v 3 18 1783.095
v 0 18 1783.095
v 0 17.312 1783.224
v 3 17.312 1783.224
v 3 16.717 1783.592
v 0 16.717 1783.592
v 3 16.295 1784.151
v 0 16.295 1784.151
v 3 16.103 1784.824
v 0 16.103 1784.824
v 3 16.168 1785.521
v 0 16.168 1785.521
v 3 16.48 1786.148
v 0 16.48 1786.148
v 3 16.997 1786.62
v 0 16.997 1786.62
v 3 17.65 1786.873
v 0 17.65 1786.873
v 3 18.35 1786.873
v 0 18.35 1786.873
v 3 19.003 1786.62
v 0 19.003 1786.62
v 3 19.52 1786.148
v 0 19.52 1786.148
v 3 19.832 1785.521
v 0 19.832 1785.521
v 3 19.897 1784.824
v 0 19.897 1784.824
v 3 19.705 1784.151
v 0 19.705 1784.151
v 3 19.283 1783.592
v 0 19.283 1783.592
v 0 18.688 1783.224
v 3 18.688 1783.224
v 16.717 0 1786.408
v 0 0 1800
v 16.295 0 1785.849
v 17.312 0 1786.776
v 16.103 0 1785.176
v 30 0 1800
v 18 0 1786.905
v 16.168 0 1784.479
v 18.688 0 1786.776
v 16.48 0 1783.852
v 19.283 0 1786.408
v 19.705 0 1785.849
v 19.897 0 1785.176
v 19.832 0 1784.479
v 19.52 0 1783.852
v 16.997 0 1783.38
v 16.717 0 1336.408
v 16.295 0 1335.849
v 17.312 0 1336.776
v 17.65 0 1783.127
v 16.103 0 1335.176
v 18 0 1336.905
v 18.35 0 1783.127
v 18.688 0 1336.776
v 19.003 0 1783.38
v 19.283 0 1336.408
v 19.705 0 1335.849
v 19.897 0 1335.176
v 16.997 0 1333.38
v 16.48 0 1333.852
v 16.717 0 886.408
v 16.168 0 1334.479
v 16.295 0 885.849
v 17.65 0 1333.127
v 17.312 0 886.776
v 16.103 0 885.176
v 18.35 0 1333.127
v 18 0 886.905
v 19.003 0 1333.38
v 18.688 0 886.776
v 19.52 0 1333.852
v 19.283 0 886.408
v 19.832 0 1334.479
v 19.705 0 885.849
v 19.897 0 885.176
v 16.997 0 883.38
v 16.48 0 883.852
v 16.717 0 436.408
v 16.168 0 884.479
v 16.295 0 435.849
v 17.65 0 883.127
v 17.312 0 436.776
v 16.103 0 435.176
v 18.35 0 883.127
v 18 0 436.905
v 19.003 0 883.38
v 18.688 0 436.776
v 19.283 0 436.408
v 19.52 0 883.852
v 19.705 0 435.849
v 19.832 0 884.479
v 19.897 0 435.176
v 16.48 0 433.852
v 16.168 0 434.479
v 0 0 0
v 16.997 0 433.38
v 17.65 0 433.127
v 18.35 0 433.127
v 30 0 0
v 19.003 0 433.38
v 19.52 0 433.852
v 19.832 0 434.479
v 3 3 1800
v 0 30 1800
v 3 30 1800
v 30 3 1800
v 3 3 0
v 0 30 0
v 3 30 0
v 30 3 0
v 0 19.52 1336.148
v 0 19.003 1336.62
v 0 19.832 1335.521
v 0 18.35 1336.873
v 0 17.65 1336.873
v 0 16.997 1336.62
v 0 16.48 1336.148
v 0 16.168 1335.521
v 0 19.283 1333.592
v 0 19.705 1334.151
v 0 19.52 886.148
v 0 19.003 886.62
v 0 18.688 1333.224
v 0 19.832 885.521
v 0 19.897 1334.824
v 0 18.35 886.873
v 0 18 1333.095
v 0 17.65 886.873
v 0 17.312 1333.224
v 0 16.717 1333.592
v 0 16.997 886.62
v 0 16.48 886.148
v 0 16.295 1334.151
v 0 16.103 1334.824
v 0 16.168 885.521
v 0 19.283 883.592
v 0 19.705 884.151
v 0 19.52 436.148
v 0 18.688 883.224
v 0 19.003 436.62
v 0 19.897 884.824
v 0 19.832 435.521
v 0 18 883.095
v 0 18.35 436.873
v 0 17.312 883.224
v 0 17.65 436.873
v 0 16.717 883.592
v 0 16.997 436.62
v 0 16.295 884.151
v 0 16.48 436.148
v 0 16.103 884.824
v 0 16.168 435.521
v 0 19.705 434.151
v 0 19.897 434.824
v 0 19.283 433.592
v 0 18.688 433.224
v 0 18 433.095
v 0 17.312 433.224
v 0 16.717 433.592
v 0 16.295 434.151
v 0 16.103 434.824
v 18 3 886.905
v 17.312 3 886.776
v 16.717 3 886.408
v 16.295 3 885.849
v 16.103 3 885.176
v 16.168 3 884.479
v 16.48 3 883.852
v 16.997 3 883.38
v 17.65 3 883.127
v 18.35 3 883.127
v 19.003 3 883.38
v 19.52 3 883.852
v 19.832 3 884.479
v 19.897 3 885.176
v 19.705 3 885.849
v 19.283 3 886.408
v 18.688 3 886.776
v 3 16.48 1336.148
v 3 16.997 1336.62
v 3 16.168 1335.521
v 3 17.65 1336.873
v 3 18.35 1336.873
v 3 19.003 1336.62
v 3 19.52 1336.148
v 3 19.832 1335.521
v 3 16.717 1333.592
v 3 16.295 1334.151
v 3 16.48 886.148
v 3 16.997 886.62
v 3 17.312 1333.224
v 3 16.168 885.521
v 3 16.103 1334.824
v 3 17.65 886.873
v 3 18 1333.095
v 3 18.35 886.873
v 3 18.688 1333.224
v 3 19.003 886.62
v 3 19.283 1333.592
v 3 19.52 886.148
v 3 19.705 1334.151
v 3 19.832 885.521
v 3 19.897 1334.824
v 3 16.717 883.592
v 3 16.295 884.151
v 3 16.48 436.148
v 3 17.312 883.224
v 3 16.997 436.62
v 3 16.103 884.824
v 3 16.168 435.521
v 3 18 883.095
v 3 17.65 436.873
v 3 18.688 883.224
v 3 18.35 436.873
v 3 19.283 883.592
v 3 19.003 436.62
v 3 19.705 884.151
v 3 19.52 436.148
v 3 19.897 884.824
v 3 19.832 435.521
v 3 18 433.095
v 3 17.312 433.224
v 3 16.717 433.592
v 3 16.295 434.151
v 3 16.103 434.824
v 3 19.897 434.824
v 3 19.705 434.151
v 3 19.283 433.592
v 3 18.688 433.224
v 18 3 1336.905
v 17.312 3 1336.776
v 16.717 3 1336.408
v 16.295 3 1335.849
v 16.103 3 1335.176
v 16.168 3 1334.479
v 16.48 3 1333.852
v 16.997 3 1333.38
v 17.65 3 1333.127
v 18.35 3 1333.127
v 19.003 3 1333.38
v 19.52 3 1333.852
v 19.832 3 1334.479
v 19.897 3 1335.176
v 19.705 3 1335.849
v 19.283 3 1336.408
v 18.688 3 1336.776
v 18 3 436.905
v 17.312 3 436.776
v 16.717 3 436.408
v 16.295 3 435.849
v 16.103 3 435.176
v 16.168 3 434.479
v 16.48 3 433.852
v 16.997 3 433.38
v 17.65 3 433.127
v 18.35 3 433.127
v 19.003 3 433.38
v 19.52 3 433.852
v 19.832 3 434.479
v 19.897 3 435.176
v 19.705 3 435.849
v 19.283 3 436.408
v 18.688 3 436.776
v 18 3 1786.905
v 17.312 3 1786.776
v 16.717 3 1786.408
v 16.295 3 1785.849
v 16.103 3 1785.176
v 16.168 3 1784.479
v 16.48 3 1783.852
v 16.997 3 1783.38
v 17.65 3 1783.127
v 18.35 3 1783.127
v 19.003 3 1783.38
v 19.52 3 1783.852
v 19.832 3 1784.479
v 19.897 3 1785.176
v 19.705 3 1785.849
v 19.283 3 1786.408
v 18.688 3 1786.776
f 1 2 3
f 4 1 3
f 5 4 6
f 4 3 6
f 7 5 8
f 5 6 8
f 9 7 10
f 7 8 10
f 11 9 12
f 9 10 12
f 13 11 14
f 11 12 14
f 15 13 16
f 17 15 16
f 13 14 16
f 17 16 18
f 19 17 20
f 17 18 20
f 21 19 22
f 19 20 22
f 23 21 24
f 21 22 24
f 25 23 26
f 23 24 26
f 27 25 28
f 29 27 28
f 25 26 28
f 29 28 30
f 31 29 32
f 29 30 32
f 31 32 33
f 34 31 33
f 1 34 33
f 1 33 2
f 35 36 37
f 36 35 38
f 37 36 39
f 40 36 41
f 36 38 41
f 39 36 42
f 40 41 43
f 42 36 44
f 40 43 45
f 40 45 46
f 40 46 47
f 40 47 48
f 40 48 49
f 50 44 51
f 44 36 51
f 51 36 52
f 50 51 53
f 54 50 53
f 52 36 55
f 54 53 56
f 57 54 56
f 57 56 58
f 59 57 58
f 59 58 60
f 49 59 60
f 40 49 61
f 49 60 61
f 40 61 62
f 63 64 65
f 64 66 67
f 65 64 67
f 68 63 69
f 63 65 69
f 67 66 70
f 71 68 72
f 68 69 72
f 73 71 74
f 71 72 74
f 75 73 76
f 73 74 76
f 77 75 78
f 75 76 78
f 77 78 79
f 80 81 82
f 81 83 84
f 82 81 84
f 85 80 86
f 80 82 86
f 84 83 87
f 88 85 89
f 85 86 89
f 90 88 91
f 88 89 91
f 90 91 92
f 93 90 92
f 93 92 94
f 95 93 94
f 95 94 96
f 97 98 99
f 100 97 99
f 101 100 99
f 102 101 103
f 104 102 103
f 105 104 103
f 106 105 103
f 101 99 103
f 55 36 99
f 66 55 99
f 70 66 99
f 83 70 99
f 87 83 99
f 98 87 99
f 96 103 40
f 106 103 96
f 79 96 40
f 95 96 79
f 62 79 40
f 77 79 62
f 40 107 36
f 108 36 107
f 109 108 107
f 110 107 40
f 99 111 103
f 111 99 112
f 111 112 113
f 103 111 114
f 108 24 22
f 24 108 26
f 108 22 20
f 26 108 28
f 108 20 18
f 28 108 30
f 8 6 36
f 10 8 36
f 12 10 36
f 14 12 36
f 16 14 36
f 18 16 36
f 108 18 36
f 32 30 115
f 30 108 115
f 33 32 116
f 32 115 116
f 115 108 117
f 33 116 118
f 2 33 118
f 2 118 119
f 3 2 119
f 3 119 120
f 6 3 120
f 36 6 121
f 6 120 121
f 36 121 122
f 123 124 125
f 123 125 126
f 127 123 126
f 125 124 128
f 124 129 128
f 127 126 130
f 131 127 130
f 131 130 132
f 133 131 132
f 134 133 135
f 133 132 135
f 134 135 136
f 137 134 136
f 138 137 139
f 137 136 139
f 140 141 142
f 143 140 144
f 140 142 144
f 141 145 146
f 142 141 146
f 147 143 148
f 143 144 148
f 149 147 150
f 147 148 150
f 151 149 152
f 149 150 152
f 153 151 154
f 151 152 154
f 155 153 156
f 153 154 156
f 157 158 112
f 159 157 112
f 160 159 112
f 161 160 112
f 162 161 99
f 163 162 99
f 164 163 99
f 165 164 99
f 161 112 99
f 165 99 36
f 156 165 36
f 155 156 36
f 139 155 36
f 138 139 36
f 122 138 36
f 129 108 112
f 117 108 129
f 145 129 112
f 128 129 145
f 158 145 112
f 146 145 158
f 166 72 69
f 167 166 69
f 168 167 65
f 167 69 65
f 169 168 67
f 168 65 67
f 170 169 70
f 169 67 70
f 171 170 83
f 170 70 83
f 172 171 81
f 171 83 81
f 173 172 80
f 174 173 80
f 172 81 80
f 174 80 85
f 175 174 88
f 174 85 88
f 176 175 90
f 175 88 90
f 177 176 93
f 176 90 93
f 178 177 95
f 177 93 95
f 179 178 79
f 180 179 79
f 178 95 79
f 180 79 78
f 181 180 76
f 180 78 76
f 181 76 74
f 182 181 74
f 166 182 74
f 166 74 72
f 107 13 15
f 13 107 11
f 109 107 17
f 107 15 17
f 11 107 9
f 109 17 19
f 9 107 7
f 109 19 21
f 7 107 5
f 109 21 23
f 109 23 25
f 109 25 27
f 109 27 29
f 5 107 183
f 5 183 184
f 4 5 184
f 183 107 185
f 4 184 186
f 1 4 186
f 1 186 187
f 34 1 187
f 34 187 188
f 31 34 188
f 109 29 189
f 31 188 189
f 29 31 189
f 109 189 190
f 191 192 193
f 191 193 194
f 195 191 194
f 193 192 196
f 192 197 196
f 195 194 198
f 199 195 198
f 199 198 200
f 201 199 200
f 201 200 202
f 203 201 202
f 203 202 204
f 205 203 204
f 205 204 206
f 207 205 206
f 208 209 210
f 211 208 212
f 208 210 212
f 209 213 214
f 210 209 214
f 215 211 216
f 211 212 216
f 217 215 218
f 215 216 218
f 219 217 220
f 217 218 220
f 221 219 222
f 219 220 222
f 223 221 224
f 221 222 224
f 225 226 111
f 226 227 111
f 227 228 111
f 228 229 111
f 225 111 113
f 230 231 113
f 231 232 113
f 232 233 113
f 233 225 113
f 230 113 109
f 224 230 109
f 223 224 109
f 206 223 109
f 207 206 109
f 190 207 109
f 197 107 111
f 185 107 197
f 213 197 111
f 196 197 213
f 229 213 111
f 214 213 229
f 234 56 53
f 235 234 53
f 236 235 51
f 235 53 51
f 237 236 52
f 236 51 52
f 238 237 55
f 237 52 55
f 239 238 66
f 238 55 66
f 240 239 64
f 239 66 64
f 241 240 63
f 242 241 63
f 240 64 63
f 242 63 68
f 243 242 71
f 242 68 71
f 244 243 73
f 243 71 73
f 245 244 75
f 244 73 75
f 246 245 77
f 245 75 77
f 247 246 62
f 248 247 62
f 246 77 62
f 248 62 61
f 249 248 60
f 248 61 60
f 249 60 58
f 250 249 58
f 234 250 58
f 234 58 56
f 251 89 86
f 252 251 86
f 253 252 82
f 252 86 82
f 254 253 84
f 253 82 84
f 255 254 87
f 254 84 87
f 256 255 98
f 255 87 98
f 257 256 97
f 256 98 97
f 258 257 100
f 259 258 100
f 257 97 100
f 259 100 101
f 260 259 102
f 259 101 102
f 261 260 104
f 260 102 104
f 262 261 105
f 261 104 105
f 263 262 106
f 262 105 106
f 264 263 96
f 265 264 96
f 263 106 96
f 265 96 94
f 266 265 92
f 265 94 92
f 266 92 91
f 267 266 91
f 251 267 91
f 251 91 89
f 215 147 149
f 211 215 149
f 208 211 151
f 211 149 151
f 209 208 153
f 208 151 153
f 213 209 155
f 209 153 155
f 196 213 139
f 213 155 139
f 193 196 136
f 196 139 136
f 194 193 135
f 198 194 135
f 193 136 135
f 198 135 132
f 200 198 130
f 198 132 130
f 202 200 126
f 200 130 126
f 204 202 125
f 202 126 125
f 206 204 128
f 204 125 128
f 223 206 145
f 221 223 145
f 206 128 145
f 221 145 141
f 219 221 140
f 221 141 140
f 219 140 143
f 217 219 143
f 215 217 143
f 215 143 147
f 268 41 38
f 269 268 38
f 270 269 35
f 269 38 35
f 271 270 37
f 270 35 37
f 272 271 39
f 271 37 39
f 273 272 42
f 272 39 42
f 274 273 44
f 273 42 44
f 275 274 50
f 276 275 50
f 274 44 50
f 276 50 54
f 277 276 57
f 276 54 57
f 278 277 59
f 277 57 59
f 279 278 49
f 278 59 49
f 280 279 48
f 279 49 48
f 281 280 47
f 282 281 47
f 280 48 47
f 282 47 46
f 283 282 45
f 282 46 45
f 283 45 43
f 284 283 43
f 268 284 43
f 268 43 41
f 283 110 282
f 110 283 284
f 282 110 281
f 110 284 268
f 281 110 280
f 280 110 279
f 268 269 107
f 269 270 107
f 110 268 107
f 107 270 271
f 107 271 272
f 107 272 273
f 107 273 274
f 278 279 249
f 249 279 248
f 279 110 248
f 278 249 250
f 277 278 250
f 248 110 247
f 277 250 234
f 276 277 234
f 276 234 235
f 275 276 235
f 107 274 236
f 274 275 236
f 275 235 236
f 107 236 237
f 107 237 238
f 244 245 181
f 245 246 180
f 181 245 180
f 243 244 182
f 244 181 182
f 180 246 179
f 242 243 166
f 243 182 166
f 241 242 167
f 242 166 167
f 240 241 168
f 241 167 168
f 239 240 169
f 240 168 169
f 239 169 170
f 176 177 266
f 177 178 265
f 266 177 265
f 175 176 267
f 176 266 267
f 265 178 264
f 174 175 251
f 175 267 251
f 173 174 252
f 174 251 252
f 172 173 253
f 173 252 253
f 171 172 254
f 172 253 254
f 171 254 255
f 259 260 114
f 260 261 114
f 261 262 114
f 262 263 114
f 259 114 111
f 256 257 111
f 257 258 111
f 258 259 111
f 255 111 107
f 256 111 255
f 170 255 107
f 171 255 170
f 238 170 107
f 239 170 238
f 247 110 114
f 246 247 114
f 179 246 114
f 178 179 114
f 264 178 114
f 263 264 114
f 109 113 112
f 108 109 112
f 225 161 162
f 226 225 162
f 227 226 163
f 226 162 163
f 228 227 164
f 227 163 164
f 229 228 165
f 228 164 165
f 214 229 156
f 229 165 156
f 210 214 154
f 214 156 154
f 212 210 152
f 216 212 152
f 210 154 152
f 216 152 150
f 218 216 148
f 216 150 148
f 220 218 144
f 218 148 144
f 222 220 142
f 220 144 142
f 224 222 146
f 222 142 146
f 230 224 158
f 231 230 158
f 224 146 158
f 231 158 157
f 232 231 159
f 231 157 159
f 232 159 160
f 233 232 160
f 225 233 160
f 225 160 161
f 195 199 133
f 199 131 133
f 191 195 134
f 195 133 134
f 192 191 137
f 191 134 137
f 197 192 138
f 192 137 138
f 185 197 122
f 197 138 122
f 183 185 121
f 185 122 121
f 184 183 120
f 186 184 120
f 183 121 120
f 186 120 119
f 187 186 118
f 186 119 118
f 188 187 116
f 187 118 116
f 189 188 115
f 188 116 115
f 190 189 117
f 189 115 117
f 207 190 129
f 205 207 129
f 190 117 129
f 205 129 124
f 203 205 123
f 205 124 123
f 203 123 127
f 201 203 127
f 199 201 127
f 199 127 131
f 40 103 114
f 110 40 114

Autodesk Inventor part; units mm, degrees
ref_plane "YZ Plane" through (0, 0, 0) normal (1, 0, 0) x (0, 1, 0)
ref_plane "XZ Plane" through (0, 0, 0) normal (0, 1, 0) x (-1, 0, 0)
ref_plane "XY Plane" through (0, 0, 0) normal (0, 0, 1) x (1, 0, 0)
sketch "Sketch1" plane through (0, 0, 0) normal (0, 0, 1) x (1, 0, 0)
  line L0 (0, 0) -> (30, 0)
  line L1 (30, 0) -> (30, 3)
  line L2 (30, 3) -> (3, 3)
  line L3 (3, 3) -> (3, 30)
  line L4 (3, 30) -> (0, 30)
  line L5 (0, 30) -> (0, 0)
  dimension "d0" = 3
  dimension "d1" = 3
  dimension "d2" = 30
  dimension "d3" = 30
extrude "Extrusion1" add sketch "Sketch1" along normal blind 1800
sketch "Sketch2" plane through (3, 3, 1800) normal (0, 1, 0) x (1, 0, 0)
  line L0 (0, 1800) -> (0, 0) projected
  line L1 (27, 0) -> (0, 0) projected
  point P0 (-3, 1800)
  point P1 (15, 15)
  point P2 (15, 465)
  point P3 (15, 915)
  point P4 (15, 1365)
  dimension "d6" = 15
  dimension "d7" = 15
  dimension "d8" = 27
  dimension "d9" = 15
  dimension "d10" = 450
  dimension "d11" = 450
  dimension "d12" = 15
  dimension "d13" = 450
  dimension "d14" = 15
hole "Hole1" at (18, 3, 1785) at (18, 3, 1335) at (18, 3, 885) at (18, 3, 435) direction (0, -1, 0) diameter 3.81 end through all
sketch "Sketch3" plane through (3, 30, 1800) normal (1, 0, 0) x (0, 0, -1)
  line L0 (0, -27) -> (0, 0) projected
  line L1 (1800, -27) -> (0, -27) projected
  point P0 (1800, -30)
  point P1 (15, -12)
  point P2 (465, -12)
  point P3 (915, -12)
  point P4 (1365, -12)
  dimension "d22" = 15
  dimension "d23" = 15
  dimension "d24" = 15
  dimension "d25" = 450
  dimension "d26" = 450
  dimension "d27" = 15
  dimension "d28" = 450
  dimension "d29" = 15
hole "Hole2" at (3, 18, 1785) at (3, 18, 1335) at (3, 18, 885) at (3, 18, 435) direction (-1, 0, 0) diameter 3.81 end through all
equation "\"d0\" = Thickness"
equation "\"d1\" = Thickness"
equation "\"d2\" = Width"
equation "\"d3\" = Width"
equation "\"d4\" = Height"
equation "\"d6\" = HoleDistance"
equation "\"d7\" = HoleDistance"
equation "\"d9\" = HoleDistance"
equation "\"d12\" = HoleDistance"
equation "\"d14\" = HoleDistance"
equation "\"d22\" = HoleDistance"
equation "\"d23\" = HoleDistance"
equation "\"d24\" = HoleDistance"
equation "\"d27\" = HoleDistance"
equation "\"d29\" = HoleDistance"
equation "\"Width\" = 30"
equation "\"Thickness\" = 3"
equation "\"Height\" = 1800"
equation "\"HoleDistance\" = 15"
properties part number "corner180"
